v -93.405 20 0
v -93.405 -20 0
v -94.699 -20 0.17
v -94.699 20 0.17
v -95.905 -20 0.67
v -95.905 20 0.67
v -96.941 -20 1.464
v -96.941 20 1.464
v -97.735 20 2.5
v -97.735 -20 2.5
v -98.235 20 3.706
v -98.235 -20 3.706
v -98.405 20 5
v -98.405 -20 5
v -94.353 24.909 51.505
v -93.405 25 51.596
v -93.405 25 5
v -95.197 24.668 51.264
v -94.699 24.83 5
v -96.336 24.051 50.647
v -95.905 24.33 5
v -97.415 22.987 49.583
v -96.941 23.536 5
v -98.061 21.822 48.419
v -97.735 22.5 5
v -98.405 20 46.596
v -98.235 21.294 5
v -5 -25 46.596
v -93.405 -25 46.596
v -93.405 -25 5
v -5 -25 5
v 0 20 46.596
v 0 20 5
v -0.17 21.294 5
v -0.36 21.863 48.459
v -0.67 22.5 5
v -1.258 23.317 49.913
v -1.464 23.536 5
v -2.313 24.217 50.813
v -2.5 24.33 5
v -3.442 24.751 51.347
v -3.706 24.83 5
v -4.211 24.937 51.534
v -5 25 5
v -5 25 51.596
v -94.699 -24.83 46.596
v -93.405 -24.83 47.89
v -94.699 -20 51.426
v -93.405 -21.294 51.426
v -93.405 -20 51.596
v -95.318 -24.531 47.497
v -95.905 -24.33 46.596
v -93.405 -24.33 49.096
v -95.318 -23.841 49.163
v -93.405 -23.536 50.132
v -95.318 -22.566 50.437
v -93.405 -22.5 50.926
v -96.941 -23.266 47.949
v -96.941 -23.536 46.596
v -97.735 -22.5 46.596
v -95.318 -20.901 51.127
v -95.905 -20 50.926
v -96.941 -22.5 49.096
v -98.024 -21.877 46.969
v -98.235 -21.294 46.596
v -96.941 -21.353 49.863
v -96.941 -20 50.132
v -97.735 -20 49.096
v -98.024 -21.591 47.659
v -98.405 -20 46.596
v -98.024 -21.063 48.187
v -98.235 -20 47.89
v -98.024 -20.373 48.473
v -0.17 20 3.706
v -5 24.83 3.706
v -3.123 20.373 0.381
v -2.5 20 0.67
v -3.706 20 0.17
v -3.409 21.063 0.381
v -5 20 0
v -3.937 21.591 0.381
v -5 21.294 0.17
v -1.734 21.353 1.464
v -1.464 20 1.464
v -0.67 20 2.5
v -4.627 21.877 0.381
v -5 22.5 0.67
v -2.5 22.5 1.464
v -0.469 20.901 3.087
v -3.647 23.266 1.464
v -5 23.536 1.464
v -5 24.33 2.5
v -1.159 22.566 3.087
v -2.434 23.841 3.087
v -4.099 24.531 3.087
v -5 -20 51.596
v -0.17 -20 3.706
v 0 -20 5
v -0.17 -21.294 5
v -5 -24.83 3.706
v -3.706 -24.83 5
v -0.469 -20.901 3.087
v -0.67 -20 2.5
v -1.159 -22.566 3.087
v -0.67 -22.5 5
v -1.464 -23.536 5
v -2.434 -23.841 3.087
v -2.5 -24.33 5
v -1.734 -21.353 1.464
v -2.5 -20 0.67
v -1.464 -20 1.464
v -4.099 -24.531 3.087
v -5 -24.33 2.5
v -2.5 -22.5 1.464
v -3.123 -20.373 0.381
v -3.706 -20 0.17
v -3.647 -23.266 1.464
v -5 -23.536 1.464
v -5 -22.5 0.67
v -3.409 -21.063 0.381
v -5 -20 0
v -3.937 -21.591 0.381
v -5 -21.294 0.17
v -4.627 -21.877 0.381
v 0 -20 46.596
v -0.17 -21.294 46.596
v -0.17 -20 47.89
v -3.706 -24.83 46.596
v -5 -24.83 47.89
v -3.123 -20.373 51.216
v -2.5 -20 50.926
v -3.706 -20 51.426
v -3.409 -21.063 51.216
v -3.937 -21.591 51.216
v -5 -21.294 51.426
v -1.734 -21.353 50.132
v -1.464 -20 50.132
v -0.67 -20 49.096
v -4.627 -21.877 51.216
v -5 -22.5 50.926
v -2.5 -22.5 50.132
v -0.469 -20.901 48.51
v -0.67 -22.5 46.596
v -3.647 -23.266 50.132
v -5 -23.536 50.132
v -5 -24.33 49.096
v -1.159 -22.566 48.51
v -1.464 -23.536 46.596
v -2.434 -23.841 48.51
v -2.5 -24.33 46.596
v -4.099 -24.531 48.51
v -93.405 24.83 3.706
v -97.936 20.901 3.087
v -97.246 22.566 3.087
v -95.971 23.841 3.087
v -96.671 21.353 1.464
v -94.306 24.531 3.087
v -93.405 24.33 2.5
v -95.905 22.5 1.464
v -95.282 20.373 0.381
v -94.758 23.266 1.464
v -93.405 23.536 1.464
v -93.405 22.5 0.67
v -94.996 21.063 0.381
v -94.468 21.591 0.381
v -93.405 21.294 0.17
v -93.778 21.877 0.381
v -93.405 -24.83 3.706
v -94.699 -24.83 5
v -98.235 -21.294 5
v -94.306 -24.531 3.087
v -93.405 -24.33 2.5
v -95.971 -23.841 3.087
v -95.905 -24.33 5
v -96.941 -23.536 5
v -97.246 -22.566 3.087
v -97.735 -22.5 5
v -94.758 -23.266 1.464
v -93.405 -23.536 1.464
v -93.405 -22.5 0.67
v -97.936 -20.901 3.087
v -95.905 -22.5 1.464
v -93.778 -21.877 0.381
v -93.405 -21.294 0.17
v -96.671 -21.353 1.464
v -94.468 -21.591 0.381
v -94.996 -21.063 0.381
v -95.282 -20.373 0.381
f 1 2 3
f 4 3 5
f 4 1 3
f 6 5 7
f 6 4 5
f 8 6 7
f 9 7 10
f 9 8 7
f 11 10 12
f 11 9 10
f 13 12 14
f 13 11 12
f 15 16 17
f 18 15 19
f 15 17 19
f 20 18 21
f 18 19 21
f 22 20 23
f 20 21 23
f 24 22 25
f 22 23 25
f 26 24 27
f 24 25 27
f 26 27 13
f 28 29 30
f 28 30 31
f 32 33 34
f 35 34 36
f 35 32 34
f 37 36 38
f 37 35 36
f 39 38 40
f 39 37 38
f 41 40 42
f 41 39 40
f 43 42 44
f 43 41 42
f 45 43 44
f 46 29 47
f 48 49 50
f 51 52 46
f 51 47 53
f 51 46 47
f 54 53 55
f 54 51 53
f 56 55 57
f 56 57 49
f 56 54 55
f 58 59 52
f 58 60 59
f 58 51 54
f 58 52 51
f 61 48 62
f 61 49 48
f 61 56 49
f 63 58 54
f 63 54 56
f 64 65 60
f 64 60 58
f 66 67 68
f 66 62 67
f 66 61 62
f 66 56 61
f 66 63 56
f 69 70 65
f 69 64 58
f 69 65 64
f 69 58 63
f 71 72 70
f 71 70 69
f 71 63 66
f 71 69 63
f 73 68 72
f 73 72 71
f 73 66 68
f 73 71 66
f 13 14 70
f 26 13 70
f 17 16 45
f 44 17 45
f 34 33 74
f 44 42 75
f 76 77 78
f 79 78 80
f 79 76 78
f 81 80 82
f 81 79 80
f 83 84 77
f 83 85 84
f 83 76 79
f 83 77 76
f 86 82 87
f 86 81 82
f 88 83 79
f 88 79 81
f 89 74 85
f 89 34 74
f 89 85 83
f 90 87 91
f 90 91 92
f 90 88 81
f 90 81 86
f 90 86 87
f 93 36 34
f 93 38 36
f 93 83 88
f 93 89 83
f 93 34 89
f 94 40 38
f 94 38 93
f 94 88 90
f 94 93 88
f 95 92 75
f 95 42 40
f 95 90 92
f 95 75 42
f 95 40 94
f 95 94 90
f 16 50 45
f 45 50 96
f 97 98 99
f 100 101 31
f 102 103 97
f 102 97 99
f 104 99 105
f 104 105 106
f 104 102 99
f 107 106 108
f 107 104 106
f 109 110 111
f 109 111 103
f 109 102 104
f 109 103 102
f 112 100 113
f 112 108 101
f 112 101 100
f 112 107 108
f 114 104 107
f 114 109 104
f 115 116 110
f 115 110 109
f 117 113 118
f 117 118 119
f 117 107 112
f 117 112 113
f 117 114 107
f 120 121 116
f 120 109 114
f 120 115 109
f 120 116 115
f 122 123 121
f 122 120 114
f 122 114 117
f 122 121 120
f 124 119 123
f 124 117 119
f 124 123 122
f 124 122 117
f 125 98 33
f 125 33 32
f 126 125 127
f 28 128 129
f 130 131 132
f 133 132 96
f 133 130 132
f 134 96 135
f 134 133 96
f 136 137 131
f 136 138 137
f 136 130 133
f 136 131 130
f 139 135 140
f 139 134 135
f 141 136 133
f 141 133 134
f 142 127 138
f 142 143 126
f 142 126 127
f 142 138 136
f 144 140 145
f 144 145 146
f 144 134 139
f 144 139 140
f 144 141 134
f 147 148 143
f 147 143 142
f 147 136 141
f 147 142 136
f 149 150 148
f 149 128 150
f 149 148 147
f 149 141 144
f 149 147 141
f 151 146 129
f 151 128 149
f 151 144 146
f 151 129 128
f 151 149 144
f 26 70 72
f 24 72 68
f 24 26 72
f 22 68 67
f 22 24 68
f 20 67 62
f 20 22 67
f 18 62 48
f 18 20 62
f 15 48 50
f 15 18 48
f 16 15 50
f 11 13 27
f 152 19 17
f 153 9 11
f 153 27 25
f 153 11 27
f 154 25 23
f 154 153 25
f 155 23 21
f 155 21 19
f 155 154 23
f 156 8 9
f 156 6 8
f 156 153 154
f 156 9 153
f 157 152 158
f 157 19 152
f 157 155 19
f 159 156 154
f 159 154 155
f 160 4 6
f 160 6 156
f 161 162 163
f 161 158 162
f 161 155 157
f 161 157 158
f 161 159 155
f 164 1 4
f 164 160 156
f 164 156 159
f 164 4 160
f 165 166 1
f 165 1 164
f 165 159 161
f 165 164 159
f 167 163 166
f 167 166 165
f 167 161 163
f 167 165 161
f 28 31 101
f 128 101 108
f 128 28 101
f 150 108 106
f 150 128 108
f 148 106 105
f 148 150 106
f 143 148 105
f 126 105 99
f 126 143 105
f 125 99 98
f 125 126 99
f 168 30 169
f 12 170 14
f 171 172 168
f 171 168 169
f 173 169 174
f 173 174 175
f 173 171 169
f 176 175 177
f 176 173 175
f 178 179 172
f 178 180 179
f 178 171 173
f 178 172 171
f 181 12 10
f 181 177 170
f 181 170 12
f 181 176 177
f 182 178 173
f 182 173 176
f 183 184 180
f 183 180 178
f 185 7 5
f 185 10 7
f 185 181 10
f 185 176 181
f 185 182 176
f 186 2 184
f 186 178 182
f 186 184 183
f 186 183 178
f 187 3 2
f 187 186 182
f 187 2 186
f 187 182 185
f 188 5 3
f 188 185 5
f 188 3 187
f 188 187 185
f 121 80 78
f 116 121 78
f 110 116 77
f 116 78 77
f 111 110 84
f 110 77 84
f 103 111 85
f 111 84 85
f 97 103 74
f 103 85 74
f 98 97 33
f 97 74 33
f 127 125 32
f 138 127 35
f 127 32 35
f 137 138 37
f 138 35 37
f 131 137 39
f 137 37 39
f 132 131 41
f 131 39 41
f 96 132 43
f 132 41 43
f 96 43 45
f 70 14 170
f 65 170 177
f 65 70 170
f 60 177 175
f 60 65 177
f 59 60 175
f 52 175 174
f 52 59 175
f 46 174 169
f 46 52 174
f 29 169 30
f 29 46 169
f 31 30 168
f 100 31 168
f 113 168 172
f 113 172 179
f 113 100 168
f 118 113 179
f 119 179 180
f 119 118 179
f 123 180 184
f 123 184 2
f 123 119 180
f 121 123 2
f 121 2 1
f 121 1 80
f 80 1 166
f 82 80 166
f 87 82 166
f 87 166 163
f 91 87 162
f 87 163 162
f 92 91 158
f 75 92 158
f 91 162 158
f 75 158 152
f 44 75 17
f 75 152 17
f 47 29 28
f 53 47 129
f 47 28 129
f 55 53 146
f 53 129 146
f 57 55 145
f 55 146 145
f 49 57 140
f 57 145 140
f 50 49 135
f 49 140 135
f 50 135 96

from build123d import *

# Parameters (mm, degrees)
F0_W         = 98.4050109982
F0_H         = 51.5961423516
F1_DEPTH     = 25
F2_R         = 5
F3_T1_DEPTH  = 76.5961423516
F3_T3_DEPTH  = 57.5
F3_S7_W      = 5
F3_S7_H      = 5
F3_T8_DEPTH  = 5
F3_S13_W     = 5
F3_S13_H     = 5
F3_T14_DEPTH = 5
F4_T1_DEPTH  = 40
F4_T3_DEPTH  = 88.4050109982
F4_S7_W      = 5
F4_S7_H      = 5
F4_T8_DEPTH  = 5
F4_S13_W     = 5
F4_S13_H     = 5
F4_T14_DEPTH = 5
F4_T18_ANGLE = 90


# Not quite as in the source:
# - a fillet or chamfer that OpenCascade refuses, or shapes differently, is made with other operations: its cross-section is extruded or revolved along the edge and cut away or added


with BuildPart() as f1:
    # F0 (on Front) → F1 (new body, symmetric)
    with BuildSketch(Plane.XZ):
        with Locations((-49.2025054991, 25.7980711758)):
            Rectangle(F0_W, F0_H)
    extrude(amount=F1_DEPTH, both=True)

    # F2
    f2_edges = [f1.edges().sort_by_distance(p)[0] for p in [
        (0, -25, 25.798071),
        (0, 0, 51.596142),
        (0, 25, 25.798071),
        (-49.202505, -25, 51.596142),
        (-49.202505, -25, 0),
        (-98.405011, -25, 25.798071),
    ]]
    fillet(f2_edges, radius=F2_R)

    # F3: fillet of radius 5 on 3 edges, made by hand

    # F3_s2 → F3_t1 (cut)
    with BuildSketch(Plane.XY.offset(-12.5)):
        with BuildLine():
            ThreePointArc((-93.4050109982, 25), (-96.9405449042, 23.5355339059), (-98.4050109982, 20))
            Line((-98.4050109982, 20), (-98.4050109982, 25))
            Line((-98.4050109982, 25), (-93.4050109982, 25))
        make_face()
    extrude(amount=F3_T1_DEPTH, mode=Mode.SUBTRACT)

    # F3_s4 → F3_t3 (cut)
    with BuildSketch(Plane.XZ.offset(-37.5)):
        with BuildLine():
            ThreePointArc((-98.4050109982, 46.5961423516), (-96.9405449042, 50.1316762576), (-93.4050109982, 51.5961423516))
            Line((-93.4050109982, 51.5961423516), (-98.4050109982, 51.5961423516))
            Line((-98.4050109982, 51.5961423516), (-98.4050109982, 46.5961423516))
        make_face()
        with BuildLine():
            ThreePointArc((-93.4050109982, 0), (-96.9405449042, 1.4644660941), (-98.4050109982, 5))
            Line((-98.4050109982, 5), (-98.4050109982, 0))
            Line((-98.4050109982, 0), (-93.4050109982, 0))
        make_face()
    extrude(amount=F3_T3_DEPTH, mode=Mode.SUBTRACT)


with BuildPart() as f3_tool6:
    # F3_s7 → F3_t8 (new body)
    with BuildSketch(Plane.XY.offset(5)):
        with Locations((-95.9050109982, -22.5)):
            Rectangle(F3_S7_W, F3_S7_H)
    extrude(amount=-F3_T8_DEPTH)

    # F3_s9 → F3_t10 (revolve, cut)
    with BuildSketch(Plane(origin=(-93.4050109982, -20, 5), x_dir=(0.7071067812, 0.7071067812, 0), z_dir=(-0.7071067812, 0.7071067812, 0))):
        with BuildLine():
            ThreePointArc((0, -5), (5, 0), (0, 5))
            Line((0, 5), (0, -5))
        make_face()
    revolve(axis=Axis((-93.4050109982, -20, 5), (0, 0, -1)), mode=Mode.SUBTRACT)


with BuildPart() as f1_1:
    add(f1.part)

    # F3_t5: cut F3_tool6
    add(f3_tool6.part, mode=Mode.SUBTRACT)


with BuildPart() as f3_tool12:
    # F3_s13 → F3_t14 (new body)
    with BuildSketch(Plane.YZ.offset(-93.4050109982)):
        with Locations((-22.5, 49.0961423516)):
            Rectangle(F3_S13_W, F3_S13_H)
    extrude(amount=-F3_T14_DEPTH)

    # F3_s15 → F3_t16 (revolve, cut)
    with BuildSketch(Plane(origin=(-93.4050109982, -20, 46.5961423516), x_dir=(0, 0.7071067812, -0.7071067812), z_dir=(0, 0.7071067812, 0.7071067812))):
        with BuildLine():
            ThreePointArc((0, -5), (5, 0), (0, 5))
            Line((0, 5), (0, -5))
        make_face()
    revolve(axis=Axis((-93.4050109982, -20, 46.5961423516), (-1, 0, 0)), mode=Mode.SUBTRACT)


with BuildPart() as f1_2:
    add(f1_1.part)

    # F3_t11: cut F3_tool12
    add(f3_tool12.part, mode=Mode.SUBTRACT)

    # F4: fillet of radius 5 on 1 edges, made by hand

    # F4_s2 → F4_t1 (cut)
    with BuildSketch(Plane.XZ.offset(-20)):
        with BuildLine():
            ThreePointArc((-5, 0), (-1.4644660941, 1.4644660941), (0, 5))
            Line((0, 5), (0, 0))
            Line((0, 0), (-5, 0))
        make_face()
    extrude(amount=F4_T1_DEPTH, mode=Mode.SUBTRACT)

    # F4_s4 → F4_t3 (cut)
    with BuildSketch(Plane.YZ.offset(-93.4050109982)):
        with BuildLine():
            ThreePointArc((20, 0), (23.5355339059, 1.4644660941), (25, 5))
            Line((25, 5), (25, 0))
            Line((25, 0), (20, 0))
        make_face()
    extrude(amount=F4_T3_DEPTH, mode=Mode.SUBTRACT)


with BuildPart() as f4_tool6:
    # F4_s7 → F4_t8 (new body)
    with BuildSketch(Plane.XY.offset(5)):
        with Locations((-2.5, -22.5)):
            Rectangle(F4_S7_W, F4_S7_H)
    extrude(amount=-F4_T8_DEPTH)

    # F4_s9 → F4_t10 (revolve, cut)
    with BuildSketch(Plane(origin=(-5, -20, 5), x_dir=(-0.7071067812, 0.7071067812, 0), z_dir=(-0.7071067812, -0.7071067812, 0))):
        with BuildLine():
            ThreePointArc((0, -5), (5, 0), (0, 5))
            Line((0, 5), (0, -5))
        make_face()
    revolve(axis=Axis((-5, -20, 5), (0, 0, -1)), mode=Mode.SUBTRACT)


with BuildPart() as f1_3:
    add(f1_2.part)

    # F4_t5: cut F4_tool6
    add(f4_tool6.part, mode=Mode.SUBTRACT)


with BuildPart() as f4_tool12:
    # F4_s13 → F4_t14 (new body)
    with BuildSketch(Plane.XY.offset(5)):
        with Locations((-95.9050109982, 22.5)):
            Rectangle(F4_S13_W, F4_S13_H)
    extrude(amount=-F4_T14_DEPTH)

    # F4_s15 → F4_t16 (revolve, cut)
    with BuildSketch(Plane(origin=(-93.4050109982, 20, 5), x_dir=(0.7071067812, -0.7071067812, 0), z_dir=(0.7071067812, 0.7071067812, 0))):
        with BuildLine():
            ThreePointArc((0, -5), (5, 0), (0, 5))
            Line((0, 5), (0, -5))
        make_face()
    revolve(axis=Axis((-93.4050109982, 20, 5), (0, 0, -1)), mode=Mode.SUBTRACT)


with BuildPart() as f1_4:
    add(f1_3.part)

    # F4_t11: cut F4_tool12
    add(f4_tool12.part, mode=Mode.SUBTRACT)

    # F4_s17 → F4_t18 (revolve, cut)
    with BuildSketch(Plane.XZ.offset(-20)):
        with BuildLine():
            ThreePointArc((-5, 0), (-1.4644660941, 1.4644660941), (0, 5))
            Line((0, 5), (0, 0))
            Line((0, 0), (-5, 0))
        make_face()
    revolve(axis=Axis((-5, 20, 0), (0, 0, 1)), revolution_arc=F4_T18_ANGLE, mode=Mode.SUBTRACT)


solid = f1_4.part
